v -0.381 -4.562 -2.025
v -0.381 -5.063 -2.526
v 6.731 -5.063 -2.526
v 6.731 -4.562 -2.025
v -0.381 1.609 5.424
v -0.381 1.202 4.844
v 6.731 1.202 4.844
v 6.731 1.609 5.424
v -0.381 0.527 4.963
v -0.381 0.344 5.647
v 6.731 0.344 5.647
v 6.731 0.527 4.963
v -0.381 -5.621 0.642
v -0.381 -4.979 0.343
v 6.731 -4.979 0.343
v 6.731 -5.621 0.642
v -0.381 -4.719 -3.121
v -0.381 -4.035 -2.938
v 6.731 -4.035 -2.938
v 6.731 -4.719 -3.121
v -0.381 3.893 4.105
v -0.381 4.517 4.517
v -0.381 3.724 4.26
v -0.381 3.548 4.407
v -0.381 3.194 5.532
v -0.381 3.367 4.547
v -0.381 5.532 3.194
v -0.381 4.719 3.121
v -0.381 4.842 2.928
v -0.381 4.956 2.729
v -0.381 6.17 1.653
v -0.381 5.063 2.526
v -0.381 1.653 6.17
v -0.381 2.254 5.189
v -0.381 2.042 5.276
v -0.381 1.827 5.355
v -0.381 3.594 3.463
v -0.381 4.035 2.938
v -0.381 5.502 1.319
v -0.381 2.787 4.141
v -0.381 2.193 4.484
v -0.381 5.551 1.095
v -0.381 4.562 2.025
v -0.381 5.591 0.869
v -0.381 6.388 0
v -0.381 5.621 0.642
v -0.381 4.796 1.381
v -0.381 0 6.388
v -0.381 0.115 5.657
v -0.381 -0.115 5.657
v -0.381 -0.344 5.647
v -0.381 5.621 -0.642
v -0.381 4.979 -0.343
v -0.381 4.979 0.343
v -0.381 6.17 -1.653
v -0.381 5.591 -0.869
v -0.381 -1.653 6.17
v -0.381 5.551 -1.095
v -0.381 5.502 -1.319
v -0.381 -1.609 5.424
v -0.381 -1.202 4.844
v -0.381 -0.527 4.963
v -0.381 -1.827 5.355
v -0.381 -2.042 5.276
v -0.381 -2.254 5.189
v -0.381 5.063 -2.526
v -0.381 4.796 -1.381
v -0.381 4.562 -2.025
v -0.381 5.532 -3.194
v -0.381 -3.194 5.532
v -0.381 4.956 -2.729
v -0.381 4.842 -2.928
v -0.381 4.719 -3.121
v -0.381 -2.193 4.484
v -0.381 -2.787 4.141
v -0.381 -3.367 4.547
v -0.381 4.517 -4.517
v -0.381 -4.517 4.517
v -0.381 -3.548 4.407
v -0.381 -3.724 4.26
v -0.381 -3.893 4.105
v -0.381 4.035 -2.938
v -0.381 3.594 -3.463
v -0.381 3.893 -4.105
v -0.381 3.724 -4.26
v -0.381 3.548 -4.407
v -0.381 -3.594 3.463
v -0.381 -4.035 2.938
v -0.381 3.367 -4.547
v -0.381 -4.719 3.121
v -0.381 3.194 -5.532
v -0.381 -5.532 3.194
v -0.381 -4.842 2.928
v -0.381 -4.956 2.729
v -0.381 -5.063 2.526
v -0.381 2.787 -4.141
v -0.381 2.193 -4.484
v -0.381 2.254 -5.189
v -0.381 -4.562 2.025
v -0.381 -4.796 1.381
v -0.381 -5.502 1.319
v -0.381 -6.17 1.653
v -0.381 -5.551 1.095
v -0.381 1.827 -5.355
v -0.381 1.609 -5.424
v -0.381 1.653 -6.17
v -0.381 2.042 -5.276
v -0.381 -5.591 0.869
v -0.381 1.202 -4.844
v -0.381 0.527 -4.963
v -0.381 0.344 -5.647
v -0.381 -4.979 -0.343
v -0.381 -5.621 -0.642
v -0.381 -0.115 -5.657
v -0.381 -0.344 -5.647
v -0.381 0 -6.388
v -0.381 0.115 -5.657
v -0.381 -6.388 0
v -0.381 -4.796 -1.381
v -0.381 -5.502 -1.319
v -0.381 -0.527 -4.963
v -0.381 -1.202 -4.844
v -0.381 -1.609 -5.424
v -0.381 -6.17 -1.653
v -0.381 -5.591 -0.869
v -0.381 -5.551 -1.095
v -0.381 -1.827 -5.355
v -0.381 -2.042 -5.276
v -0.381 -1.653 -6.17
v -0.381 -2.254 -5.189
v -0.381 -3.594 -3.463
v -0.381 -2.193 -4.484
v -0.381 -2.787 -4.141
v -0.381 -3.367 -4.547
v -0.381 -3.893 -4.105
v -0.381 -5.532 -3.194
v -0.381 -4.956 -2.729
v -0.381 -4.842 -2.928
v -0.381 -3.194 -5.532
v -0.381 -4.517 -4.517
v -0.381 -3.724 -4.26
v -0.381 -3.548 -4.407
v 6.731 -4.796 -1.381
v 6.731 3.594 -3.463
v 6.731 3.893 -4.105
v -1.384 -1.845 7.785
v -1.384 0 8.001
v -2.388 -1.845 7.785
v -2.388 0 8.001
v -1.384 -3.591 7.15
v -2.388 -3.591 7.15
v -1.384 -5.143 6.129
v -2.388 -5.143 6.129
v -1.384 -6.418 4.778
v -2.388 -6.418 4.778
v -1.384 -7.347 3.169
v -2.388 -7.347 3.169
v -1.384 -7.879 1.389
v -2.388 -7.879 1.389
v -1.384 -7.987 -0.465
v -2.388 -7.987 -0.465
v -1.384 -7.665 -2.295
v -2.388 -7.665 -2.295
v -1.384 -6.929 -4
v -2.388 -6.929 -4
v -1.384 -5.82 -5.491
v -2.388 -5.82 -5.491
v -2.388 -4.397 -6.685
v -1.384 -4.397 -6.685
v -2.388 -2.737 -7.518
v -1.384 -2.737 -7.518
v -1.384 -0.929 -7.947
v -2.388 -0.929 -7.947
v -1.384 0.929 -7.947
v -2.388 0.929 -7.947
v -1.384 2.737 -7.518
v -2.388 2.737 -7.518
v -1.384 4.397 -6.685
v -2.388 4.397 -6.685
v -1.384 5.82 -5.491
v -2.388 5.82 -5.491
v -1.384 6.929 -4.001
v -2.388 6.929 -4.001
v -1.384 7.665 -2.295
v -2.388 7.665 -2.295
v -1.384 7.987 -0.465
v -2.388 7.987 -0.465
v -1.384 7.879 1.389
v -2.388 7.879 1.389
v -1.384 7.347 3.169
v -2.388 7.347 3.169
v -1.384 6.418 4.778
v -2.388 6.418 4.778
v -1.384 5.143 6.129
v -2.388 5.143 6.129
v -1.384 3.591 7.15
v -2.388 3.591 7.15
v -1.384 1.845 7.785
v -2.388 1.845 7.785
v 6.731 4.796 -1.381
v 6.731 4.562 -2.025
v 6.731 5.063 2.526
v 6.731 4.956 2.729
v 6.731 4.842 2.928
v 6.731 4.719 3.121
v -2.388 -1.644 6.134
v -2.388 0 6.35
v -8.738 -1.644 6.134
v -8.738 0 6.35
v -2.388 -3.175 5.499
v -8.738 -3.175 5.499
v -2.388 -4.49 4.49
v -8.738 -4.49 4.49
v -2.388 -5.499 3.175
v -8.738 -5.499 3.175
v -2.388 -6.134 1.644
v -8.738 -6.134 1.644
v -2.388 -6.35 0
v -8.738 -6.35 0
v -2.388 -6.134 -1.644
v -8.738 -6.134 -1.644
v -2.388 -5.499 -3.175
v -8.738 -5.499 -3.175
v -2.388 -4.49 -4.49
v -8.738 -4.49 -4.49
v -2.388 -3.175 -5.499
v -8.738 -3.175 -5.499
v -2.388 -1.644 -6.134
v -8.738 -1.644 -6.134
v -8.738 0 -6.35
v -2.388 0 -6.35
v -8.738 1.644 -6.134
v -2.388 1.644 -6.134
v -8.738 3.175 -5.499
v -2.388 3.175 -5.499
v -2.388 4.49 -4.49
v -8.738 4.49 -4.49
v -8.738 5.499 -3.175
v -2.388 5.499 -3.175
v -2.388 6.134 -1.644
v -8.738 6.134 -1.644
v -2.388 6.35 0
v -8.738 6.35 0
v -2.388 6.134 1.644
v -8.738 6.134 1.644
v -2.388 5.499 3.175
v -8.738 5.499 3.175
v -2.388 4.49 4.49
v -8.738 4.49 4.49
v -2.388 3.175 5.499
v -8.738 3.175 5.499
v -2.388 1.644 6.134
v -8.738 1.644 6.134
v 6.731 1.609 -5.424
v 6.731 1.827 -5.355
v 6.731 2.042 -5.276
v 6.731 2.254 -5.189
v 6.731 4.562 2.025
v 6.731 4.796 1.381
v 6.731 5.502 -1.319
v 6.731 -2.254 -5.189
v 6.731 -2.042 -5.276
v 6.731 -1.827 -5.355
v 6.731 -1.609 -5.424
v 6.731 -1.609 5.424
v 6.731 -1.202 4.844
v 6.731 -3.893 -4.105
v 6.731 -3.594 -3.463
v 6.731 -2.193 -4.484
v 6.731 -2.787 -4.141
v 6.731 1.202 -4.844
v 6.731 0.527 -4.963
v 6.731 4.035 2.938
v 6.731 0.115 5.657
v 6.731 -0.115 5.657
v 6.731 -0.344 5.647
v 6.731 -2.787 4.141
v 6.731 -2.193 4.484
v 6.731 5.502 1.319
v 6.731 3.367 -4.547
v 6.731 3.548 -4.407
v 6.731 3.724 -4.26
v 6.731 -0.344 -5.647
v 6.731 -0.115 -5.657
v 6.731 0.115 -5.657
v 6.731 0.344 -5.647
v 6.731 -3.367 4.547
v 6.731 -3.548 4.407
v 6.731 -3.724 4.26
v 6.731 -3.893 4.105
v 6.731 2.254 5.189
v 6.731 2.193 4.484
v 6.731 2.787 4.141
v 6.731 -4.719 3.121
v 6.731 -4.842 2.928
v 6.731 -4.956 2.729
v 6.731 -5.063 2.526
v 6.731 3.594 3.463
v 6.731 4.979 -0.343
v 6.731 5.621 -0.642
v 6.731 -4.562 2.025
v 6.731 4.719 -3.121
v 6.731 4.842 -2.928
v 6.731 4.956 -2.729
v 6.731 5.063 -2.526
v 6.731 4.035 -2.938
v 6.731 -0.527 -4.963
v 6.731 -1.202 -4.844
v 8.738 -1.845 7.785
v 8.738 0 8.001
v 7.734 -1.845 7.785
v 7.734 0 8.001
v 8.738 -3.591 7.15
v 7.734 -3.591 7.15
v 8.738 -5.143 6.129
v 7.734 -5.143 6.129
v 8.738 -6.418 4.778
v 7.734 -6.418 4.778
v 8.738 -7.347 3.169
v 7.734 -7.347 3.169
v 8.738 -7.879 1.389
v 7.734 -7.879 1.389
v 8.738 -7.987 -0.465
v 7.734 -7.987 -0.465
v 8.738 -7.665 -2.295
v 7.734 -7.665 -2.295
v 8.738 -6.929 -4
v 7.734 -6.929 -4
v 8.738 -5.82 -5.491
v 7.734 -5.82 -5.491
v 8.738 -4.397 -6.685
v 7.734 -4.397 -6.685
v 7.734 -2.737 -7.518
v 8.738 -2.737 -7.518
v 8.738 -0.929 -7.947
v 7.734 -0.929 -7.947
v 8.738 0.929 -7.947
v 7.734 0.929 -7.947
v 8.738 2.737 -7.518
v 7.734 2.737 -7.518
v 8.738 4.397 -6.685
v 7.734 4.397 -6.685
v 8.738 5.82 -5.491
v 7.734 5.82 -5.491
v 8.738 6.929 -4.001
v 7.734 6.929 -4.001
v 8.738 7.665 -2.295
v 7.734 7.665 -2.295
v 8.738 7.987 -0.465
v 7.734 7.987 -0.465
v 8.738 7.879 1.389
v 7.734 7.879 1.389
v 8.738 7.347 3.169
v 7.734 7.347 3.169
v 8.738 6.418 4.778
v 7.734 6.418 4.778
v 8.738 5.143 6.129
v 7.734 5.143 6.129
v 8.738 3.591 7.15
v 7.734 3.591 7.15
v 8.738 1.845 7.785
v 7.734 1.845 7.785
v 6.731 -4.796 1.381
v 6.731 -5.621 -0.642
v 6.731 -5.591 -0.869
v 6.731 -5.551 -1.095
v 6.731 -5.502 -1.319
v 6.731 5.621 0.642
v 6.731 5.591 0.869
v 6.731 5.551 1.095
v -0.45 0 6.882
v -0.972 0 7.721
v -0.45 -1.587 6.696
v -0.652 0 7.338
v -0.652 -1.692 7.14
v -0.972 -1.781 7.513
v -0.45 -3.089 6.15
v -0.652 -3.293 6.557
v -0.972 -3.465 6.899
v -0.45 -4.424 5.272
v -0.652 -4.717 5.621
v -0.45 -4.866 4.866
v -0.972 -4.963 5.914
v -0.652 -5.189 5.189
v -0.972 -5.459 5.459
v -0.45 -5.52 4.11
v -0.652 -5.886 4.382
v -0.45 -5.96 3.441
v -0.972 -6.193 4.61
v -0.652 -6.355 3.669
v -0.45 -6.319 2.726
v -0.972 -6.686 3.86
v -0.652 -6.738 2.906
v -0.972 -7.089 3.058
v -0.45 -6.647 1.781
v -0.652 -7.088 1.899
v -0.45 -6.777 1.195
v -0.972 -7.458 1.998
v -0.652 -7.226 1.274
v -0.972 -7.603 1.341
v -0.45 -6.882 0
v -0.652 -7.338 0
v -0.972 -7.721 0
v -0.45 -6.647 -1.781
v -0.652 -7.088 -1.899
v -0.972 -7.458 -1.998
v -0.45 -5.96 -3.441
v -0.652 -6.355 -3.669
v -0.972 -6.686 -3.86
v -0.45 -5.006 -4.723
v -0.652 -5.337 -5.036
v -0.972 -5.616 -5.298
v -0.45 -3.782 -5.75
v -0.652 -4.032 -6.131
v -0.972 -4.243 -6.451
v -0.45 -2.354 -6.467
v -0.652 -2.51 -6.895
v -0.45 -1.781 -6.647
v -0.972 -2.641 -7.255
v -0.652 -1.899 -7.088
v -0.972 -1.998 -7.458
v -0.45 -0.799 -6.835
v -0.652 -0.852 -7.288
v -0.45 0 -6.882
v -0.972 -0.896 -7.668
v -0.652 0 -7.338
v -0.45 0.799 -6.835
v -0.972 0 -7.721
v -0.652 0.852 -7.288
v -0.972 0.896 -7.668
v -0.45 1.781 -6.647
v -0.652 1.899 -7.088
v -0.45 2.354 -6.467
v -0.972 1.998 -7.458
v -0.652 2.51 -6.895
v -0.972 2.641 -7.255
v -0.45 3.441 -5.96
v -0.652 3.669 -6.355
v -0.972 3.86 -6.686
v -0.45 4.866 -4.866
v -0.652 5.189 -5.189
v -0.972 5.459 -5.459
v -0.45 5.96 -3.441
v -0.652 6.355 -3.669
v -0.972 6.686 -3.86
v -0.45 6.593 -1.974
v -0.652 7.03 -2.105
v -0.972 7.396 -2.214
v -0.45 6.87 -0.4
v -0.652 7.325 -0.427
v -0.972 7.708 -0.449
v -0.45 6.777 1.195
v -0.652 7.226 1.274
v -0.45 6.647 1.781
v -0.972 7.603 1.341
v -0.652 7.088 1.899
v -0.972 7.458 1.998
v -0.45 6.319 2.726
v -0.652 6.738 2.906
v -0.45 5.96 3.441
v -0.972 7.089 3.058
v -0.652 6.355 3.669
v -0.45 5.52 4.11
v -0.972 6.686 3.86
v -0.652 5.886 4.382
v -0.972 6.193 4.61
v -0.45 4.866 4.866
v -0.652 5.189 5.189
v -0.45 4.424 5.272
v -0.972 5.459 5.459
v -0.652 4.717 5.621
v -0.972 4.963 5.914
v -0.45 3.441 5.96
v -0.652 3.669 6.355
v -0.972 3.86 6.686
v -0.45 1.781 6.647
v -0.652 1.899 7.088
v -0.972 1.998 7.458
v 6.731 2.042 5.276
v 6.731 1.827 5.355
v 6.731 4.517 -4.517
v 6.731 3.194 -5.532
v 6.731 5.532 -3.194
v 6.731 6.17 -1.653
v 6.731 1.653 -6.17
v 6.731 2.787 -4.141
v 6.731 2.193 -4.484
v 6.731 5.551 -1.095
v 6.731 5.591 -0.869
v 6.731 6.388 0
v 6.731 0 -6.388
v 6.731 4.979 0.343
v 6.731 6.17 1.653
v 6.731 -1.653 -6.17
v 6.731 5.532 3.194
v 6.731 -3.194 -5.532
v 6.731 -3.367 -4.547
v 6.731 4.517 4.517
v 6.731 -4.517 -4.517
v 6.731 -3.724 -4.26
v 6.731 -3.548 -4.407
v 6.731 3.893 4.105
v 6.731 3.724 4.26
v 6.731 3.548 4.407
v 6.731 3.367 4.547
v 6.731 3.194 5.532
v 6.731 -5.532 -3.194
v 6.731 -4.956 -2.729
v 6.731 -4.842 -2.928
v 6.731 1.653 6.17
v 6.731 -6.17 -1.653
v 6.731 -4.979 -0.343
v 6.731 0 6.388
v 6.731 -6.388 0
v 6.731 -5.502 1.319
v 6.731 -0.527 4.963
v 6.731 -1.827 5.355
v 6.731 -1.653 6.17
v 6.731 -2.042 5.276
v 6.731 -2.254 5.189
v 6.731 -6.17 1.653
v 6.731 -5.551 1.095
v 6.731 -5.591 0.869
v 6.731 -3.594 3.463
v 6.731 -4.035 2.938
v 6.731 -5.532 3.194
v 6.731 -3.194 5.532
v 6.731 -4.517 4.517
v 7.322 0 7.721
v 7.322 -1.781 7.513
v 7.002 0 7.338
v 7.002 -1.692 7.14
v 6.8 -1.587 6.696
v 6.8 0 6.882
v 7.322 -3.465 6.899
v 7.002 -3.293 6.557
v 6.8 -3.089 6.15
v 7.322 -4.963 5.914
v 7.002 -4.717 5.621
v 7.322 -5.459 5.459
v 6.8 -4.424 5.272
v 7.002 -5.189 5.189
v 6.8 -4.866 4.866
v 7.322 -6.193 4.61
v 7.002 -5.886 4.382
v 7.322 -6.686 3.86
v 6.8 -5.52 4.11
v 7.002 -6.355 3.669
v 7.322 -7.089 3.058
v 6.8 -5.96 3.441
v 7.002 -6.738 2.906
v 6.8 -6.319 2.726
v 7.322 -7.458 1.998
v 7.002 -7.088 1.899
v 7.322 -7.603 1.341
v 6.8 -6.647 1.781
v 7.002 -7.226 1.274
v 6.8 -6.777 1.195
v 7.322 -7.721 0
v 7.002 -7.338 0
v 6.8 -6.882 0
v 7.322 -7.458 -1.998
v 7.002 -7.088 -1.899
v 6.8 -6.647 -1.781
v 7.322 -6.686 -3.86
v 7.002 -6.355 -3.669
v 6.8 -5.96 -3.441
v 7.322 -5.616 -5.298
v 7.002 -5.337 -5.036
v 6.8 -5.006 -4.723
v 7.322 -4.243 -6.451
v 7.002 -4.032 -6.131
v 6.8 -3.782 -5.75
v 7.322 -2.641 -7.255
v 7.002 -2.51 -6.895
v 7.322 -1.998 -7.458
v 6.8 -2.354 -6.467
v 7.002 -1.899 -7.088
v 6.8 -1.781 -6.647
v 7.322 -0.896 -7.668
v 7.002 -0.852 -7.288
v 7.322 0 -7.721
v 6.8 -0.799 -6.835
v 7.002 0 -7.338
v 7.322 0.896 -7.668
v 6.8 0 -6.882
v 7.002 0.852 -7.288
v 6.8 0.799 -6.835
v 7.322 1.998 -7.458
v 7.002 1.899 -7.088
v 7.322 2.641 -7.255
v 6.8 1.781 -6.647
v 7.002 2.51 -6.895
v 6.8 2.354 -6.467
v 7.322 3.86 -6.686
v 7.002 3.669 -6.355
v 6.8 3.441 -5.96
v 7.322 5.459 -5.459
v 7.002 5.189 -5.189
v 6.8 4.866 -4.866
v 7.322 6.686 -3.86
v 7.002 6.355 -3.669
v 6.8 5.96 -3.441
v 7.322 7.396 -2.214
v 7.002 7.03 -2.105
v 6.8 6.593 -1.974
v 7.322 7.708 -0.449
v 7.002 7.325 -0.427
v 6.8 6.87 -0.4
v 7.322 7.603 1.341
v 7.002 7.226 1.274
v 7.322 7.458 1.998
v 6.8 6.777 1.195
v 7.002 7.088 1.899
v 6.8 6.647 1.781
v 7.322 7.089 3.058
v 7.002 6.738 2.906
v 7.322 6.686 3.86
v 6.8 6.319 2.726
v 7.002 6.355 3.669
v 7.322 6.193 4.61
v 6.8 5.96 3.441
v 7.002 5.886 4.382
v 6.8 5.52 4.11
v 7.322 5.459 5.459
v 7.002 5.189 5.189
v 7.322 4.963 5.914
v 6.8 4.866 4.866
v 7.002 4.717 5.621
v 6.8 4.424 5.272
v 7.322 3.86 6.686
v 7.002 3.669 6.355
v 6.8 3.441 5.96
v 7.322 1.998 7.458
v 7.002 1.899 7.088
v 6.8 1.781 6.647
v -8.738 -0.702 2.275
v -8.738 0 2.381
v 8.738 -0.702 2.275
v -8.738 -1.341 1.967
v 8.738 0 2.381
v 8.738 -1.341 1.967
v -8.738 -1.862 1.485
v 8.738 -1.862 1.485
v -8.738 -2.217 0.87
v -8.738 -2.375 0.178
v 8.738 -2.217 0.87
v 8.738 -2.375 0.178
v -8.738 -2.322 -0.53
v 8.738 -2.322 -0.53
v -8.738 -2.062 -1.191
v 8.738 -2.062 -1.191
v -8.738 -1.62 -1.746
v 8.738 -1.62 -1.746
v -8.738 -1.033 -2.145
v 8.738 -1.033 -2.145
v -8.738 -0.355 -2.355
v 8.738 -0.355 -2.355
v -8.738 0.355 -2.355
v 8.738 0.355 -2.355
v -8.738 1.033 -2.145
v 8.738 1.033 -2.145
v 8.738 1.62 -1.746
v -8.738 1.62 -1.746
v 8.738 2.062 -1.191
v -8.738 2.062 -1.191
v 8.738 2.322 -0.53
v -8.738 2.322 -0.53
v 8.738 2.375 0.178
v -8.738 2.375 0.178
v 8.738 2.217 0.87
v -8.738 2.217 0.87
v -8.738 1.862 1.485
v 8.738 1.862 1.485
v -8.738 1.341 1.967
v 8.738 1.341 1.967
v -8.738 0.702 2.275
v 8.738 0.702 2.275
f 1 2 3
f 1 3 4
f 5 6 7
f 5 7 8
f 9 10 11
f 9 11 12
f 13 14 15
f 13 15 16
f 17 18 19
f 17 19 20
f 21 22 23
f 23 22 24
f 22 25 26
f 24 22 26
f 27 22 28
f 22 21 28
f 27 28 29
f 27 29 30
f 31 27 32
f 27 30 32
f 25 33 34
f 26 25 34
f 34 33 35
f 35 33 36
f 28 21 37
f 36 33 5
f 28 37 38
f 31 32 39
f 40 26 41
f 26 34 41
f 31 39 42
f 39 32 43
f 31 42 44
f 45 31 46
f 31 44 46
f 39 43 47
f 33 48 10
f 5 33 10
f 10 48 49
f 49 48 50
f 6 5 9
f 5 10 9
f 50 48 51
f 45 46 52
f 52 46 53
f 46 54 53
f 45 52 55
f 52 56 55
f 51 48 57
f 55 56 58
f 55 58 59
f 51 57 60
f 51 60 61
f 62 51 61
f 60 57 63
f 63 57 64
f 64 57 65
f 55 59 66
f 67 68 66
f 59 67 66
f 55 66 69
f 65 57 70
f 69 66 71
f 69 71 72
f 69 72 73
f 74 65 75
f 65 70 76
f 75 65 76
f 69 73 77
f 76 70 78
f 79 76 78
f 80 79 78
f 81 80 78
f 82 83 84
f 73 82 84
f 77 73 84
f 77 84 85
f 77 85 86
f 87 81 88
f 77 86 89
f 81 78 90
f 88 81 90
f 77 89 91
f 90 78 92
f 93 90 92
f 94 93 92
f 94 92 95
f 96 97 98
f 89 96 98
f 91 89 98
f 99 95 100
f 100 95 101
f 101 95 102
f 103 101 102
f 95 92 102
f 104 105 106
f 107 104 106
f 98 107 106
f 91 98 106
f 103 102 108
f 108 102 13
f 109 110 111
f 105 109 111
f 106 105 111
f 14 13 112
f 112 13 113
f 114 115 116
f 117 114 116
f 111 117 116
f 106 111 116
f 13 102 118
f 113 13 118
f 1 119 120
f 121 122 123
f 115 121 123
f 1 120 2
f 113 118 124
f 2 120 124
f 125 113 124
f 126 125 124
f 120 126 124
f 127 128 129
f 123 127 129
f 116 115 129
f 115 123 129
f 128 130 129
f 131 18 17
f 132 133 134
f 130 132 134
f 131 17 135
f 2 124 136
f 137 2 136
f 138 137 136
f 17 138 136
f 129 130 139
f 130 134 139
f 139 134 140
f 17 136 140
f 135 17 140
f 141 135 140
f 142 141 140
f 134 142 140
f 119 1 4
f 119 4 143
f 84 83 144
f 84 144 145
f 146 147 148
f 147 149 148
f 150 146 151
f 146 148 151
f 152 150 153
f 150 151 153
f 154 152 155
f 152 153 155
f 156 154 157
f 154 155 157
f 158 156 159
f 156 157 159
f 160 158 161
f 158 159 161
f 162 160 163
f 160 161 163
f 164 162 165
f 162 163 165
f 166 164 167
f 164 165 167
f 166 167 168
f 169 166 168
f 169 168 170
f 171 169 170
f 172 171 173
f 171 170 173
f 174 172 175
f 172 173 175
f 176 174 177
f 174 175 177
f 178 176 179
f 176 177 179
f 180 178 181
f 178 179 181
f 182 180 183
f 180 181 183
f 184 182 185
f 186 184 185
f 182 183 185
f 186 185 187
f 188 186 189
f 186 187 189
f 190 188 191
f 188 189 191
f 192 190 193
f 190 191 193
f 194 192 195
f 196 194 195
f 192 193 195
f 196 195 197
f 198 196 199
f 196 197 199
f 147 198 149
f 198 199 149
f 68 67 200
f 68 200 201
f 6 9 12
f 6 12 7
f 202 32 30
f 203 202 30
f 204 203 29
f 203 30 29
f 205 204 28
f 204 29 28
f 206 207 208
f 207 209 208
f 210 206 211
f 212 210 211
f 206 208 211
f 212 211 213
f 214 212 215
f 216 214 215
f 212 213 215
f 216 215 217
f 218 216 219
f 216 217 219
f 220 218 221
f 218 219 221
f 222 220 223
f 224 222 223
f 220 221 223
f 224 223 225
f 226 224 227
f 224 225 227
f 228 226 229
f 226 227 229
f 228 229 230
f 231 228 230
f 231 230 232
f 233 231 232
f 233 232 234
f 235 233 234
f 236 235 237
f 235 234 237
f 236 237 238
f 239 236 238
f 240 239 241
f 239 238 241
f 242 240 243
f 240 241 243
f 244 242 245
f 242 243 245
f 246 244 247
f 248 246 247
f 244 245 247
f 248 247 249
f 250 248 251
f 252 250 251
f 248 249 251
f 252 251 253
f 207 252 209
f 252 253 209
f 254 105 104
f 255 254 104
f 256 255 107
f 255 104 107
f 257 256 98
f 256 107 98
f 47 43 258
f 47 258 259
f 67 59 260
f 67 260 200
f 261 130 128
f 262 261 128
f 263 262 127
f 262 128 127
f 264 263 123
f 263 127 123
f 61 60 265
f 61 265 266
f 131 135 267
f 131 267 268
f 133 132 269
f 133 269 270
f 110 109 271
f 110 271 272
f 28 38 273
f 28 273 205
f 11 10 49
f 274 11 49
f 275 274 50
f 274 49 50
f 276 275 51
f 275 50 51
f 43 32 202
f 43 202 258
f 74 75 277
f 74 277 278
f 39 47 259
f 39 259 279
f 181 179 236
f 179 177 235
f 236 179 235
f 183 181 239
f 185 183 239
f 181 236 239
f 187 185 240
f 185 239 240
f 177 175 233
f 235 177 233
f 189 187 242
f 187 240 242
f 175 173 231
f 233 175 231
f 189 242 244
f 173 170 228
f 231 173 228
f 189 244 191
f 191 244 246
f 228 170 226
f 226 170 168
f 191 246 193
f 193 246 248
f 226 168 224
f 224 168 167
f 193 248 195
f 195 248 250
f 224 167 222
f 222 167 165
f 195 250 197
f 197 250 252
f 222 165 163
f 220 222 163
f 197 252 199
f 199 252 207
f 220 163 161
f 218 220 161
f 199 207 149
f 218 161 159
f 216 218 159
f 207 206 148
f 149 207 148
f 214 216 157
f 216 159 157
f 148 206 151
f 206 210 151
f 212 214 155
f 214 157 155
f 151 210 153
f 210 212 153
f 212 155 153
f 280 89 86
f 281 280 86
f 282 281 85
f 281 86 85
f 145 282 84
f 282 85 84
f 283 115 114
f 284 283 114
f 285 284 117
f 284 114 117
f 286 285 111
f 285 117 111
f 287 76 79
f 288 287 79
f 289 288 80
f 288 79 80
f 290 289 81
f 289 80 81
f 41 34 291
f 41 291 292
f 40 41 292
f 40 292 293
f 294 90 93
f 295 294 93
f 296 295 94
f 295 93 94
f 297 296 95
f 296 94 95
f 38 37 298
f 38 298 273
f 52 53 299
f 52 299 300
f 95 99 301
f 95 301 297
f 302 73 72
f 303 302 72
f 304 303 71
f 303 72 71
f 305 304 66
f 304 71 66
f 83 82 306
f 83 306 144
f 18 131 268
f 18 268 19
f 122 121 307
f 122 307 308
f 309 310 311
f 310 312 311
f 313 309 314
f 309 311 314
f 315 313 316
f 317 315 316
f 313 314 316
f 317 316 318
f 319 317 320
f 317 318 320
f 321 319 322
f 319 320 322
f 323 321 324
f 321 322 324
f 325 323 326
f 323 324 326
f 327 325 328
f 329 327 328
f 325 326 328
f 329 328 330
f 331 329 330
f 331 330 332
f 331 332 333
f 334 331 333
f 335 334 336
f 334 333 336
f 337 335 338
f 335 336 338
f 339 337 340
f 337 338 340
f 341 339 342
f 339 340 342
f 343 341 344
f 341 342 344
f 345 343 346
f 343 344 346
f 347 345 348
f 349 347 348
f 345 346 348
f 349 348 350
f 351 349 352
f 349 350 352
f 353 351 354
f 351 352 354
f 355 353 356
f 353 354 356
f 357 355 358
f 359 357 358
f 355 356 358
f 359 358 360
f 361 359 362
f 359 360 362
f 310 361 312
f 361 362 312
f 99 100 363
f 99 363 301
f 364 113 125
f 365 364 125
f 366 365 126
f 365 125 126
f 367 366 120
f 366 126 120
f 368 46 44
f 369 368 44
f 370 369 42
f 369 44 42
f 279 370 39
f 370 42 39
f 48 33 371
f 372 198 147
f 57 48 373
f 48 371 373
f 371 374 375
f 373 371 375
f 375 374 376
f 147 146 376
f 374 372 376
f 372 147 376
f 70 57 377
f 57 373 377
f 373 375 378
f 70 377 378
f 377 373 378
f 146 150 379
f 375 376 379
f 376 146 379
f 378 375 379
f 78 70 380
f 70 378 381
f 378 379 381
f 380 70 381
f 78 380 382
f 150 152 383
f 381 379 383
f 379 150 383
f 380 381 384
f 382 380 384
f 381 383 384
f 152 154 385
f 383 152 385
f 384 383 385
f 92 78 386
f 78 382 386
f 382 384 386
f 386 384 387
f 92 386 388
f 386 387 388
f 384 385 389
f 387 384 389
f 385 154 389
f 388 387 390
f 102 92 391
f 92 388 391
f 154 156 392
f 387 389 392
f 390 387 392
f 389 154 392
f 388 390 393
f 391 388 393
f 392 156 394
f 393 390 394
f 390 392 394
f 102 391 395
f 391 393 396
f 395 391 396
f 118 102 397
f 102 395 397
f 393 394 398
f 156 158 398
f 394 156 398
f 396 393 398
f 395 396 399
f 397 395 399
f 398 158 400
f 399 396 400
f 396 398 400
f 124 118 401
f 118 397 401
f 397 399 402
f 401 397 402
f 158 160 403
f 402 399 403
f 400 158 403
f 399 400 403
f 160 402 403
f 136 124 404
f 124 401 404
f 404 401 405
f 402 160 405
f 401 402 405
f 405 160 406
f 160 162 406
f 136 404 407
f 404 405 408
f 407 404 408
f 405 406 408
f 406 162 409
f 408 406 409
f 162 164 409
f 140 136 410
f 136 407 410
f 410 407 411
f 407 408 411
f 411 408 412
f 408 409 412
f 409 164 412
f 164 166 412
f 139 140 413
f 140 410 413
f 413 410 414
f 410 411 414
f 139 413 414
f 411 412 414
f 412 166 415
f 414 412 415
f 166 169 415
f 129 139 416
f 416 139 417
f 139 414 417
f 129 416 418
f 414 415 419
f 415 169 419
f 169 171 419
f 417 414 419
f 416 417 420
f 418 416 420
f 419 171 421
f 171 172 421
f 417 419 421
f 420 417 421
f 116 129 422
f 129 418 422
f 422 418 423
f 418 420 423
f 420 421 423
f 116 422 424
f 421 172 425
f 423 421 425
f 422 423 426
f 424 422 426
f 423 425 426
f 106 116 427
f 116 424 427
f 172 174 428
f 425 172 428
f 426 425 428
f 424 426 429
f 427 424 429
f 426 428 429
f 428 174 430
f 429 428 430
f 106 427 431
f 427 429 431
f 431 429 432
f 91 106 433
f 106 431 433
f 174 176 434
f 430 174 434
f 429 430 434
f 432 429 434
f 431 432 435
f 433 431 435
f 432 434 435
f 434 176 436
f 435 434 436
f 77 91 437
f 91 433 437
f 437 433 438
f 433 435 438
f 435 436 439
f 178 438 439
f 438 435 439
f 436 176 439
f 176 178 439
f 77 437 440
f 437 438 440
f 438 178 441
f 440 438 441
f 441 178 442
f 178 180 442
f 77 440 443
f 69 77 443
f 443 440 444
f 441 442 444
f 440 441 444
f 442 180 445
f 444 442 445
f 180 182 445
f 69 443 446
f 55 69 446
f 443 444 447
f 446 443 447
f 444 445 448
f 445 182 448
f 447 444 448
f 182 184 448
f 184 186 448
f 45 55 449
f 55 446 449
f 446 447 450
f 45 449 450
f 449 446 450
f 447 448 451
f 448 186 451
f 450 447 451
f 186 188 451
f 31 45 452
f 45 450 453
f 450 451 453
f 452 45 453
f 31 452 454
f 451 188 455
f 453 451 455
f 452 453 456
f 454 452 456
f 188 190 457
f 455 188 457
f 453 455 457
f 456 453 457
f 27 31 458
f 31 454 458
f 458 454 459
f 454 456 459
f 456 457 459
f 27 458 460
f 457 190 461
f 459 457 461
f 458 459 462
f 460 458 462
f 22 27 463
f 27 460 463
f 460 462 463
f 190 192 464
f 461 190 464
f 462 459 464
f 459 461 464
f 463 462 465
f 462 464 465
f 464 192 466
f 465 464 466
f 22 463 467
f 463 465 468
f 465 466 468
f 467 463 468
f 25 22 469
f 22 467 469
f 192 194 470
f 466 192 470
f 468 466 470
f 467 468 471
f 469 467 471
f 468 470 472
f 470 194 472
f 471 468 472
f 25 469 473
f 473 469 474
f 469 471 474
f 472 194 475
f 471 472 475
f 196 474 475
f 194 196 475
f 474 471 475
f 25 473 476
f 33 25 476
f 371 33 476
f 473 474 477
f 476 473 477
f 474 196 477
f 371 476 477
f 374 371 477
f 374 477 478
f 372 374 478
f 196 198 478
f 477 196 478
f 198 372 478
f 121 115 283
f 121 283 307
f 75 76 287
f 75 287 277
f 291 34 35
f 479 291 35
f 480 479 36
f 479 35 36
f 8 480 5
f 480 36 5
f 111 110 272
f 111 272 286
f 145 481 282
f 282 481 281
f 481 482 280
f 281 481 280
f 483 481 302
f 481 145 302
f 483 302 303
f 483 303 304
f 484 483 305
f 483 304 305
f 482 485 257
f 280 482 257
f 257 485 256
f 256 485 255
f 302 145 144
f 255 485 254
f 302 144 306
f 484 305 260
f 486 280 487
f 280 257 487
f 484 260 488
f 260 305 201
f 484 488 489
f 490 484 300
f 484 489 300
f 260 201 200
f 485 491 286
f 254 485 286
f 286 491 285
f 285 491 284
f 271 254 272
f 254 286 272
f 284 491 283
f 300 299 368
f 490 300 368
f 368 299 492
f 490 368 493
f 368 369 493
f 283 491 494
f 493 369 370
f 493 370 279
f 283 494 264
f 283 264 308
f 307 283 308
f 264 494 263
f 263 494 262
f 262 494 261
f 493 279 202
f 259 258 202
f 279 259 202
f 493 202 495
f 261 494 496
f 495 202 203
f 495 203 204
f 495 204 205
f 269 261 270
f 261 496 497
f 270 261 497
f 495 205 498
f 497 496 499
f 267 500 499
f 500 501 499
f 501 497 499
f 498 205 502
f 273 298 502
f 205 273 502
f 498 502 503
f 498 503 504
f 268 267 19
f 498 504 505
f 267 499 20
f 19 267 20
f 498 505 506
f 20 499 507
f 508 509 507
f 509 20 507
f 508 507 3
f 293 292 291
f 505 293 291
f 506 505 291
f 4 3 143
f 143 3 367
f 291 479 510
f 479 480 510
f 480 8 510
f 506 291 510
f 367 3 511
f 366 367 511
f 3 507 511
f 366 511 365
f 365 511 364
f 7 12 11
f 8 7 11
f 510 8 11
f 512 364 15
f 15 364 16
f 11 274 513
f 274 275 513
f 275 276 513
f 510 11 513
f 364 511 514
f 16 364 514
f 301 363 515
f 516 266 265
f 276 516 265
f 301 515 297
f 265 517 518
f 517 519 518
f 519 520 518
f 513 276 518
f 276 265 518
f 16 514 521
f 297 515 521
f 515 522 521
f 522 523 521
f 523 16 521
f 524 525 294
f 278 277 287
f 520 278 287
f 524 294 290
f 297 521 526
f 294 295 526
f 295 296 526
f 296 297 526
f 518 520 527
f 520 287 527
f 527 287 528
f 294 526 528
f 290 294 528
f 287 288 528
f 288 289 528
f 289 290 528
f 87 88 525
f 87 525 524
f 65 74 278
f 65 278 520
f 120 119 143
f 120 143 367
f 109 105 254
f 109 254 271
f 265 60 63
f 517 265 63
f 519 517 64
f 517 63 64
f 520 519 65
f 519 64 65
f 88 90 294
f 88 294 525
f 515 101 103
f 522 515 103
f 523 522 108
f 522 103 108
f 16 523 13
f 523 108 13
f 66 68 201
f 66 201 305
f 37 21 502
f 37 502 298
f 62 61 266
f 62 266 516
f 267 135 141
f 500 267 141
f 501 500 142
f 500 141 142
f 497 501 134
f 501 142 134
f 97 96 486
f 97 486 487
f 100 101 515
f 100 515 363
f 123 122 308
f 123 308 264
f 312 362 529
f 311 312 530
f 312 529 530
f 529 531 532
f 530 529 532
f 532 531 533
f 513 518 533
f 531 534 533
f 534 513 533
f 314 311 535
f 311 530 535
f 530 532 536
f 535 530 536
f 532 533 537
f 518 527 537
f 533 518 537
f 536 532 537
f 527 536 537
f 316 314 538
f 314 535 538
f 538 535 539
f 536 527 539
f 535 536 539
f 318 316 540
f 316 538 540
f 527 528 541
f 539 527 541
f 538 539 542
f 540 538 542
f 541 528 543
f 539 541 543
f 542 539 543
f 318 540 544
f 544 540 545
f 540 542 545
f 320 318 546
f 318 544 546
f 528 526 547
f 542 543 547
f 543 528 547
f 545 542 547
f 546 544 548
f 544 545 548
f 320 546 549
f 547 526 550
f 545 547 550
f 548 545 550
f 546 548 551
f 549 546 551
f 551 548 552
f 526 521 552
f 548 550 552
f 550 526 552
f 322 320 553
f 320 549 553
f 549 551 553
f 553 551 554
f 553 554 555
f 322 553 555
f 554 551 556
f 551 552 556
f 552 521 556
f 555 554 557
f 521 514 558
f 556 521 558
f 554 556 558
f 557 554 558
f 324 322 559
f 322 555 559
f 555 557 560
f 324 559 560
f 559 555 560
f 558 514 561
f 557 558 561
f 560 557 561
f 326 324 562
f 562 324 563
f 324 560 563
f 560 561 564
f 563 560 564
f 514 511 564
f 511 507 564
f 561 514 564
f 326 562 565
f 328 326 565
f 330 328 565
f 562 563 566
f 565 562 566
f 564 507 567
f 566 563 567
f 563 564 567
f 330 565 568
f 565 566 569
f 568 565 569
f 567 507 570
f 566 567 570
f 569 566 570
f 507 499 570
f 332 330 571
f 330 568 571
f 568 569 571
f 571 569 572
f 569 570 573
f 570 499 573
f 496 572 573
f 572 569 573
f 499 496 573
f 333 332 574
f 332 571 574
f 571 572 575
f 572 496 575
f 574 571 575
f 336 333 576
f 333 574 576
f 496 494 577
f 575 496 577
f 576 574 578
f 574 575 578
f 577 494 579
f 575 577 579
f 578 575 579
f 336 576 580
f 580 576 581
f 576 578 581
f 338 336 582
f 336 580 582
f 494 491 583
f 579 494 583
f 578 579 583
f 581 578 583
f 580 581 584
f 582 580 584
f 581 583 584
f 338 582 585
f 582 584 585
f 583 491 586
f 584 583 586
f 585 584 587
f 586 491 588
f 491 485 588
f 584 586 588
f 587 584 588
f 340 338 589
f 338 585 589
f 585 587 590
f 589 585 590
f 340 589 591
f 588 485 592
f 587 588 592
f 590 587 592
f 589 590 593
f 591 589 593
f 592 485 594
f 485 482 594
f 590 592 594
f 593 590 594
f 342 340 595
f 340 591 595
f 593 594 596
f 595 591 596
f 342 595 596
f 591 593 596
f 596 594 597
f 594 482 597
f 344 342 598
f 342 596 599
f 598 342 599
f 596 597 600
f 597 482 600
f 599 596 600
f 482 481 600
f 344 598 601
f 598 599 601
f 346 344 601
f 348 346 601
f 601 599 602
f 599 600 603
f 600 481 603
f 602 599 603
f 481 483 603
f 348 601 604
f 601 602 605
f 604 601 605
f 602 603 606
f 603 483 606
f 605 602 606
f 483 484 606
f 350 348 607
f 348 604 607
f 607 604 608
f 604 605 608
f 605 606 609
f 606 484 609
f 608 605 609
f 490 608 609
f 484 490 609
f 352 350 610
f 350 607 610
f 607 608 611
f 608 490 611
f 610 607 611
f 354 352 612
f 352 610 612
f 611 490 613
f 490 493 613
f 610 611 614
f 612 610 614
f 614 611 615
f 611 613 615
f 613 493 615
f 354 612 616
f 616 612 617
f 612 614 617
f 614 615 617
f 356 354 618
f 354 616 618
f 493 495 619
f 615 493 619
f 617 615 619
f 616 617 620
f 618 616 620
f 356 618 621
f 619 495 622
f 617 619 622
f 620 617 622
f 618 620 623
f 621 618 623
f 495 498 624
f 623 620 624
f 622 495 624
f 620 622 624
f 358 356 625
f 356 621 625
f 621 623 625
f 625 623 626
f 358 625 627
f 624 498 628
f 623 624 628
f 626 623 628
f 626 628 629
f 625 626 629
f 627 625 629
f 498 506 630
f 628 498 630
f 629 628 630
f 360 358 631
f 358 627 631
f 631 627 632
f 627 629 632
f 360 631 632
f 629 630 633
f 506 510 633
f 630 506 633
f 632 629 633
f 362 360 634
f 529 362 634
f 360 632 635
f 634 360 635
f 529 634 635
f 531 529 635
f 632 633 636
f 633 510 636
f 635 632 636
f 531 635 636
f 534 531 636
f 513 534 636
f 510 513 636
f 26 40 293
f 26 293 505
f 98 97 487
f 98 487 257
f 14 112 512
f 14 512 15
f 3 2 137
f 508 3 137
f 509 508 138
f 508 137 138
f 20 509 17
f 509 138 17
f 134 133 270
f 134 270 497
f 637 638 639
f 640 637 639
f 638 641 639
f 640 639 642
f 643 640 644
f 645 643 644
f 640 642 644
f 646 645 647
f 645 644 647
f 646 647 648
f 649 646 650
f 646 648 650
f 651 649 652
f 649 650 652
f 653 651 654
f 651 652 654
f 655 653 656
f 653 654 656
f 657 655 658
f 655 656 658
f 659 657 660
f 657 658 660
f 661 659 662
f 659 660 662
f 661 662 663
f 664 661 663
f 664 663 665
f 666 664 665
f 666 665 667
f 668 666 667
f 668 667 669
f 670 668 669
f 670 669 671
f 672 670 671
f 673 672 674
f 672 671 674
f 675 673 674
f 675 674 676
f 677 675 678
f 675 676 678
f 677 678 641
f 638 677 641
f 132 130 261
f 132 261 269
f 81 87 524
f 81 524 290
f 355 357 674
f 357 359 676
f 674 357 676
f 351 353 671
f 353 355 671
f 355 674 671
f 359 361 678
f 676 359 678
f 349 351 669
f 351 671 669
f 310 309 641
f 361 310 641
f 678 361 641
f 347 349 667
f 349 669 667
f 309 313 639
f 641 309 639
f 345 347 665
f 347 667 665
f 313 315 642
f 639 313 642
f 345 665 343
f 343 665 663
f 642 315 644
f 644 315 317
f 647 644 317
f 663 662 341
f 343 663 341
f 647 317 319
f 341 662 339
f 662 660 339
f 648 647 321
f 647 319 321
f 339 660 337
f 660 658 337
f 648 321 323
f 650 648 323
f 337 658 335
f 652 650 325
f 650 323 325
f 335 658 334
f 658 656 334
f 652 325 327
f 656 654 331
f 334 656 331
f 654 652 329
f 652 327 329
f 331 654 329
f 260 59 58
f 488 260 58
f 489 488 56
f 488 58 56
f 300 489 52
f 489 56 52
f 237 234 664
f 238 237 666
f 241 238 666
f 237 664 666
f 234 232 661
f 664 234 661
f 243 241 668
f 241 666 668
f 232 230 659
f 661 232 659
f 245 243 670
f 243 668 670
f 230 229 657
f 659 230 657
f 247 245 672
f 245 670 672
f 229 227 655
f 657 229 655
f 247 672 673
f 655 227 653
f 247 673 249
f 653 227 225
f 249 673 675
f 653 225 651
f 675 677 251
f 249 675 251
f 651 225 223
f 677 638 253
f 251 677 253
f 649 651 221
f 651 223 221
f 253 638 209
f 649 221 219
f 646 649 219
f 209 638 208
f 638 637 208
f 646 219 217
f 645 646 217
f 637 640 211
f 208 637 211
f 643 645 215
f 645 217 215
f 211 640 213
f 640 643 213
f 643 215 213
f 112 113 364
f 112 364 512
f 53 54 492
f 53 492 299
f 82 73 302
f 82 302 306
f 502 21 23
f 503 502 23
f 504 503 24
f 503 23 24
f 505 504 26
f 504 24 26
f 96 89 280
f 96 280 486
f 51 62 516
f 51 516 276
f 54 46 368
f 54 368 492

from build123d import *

# Parameters (mm, degrees)
SKETCH4_R          = 5.8166
SKETCH4_R_2        = 5.65785
CUT_EXTRUDE2_DEPTH = 7.112
CUT_EXTRUDE1_DEPTH = 7.112
CIRPATTERN1_COUNT  = 18


with BuildPart() as part:
    # Sketch1 → Revolve1 (revolve)
    with BuildSketch(Plane.XY, mode=Mode.PRIVATE) as revolve1_sk:
        with BuildLine():
            Line((-8.7376, 2.38125), (8.7376, 2.38125))
            Line((8.7376, 2.38125), (8.7376, 8.001))
            Line((8.7376, 8.001), (7.7343, 8.001))
            ThreePointArc((7.7343, 8.001), (7.002290733, 7.337844347), (6.731, 6.3881))
            Line((6.731, 6.3881), (6.731, 5.8166))
            Line((6.731, 5.8166), (-0.381, 5.8166))
            Line((-0.381, 5.8166), (-0.381, 6.3881))
            ThreePointArc((-0.381, 6.3881), (-0.652290733, 7.337844347), (-1.3843, 8.001))
            Line((-1.3843, 8.001), (-2.3876, 8.001))
            Line((-2.3876, 8.001), (-2.3876, 6.35))
            Line((-2.3876, 6.35), (-8.7376, 6.35))
            Line((-8.7376, 6.35), (-8.7376, 2.38125))
        make_face()
    revolve(revolve1_sk.sketch.rotate(Axis((-8.7376, 0, 0), (1, 0, 0)), 90), axis=Axis((-8.7376, 0, 0), (1, 0, 0)))

    # Sketch4 → Cut-Extrude2 (cut)
    with BuildSketch(Plane(origin=(-0.381, 0, 0), x_dir=(0, 0, -1), z_dir=(1, 0, 0))):
        Circle(SKETCH4_R)
        Circle(SKETCH4_R_2, mode=Mode.SUBTRACT)
    extrude(amount=CUT_EXTRUDE2_DEPTH, mode=Mode.SUBTRACT)

    # Sketch3 → Cut-Extrude1 (cut)
    with BuildSketch(Plane(origin=(-0.381, 0, 0), x_dir=(0, 0, -1), z_dir=(1, 0, 0))):
        with BuildLine():
            Line((-0.64235315, 5.621267566), (-0.342998874, 4.97930025))
            Line((-0.342998874, 4.97930025), (0.342998874, 4.97930025))
            Line((0.342998874, 4.97930025), (0.64235315, 5.621267566))
            ThreePointArc((0.64235315, 5.621267566), (0, 5.65785), (-0.64235315, 5.621267566))
        make_face()
    cut_extrude1 = extrude(amount=CUT_EXTRUDE1_DEPTH, mode=Mode.SUBTRACT)

    # CirPattern1: Cut-Extrude1 ×18 about axis
    cirpattern1_axis = Axis((0, 0, 0), (1, 0, 0))
    for i in range(1, CIRPATTERN1_COUNT):
        add(cut_extrude1.rotate(cirpattern1_axis, i * 360 / CIRPATTERN1_COUNT), mode=Mode.SUBTRACT)


solid = part.part
